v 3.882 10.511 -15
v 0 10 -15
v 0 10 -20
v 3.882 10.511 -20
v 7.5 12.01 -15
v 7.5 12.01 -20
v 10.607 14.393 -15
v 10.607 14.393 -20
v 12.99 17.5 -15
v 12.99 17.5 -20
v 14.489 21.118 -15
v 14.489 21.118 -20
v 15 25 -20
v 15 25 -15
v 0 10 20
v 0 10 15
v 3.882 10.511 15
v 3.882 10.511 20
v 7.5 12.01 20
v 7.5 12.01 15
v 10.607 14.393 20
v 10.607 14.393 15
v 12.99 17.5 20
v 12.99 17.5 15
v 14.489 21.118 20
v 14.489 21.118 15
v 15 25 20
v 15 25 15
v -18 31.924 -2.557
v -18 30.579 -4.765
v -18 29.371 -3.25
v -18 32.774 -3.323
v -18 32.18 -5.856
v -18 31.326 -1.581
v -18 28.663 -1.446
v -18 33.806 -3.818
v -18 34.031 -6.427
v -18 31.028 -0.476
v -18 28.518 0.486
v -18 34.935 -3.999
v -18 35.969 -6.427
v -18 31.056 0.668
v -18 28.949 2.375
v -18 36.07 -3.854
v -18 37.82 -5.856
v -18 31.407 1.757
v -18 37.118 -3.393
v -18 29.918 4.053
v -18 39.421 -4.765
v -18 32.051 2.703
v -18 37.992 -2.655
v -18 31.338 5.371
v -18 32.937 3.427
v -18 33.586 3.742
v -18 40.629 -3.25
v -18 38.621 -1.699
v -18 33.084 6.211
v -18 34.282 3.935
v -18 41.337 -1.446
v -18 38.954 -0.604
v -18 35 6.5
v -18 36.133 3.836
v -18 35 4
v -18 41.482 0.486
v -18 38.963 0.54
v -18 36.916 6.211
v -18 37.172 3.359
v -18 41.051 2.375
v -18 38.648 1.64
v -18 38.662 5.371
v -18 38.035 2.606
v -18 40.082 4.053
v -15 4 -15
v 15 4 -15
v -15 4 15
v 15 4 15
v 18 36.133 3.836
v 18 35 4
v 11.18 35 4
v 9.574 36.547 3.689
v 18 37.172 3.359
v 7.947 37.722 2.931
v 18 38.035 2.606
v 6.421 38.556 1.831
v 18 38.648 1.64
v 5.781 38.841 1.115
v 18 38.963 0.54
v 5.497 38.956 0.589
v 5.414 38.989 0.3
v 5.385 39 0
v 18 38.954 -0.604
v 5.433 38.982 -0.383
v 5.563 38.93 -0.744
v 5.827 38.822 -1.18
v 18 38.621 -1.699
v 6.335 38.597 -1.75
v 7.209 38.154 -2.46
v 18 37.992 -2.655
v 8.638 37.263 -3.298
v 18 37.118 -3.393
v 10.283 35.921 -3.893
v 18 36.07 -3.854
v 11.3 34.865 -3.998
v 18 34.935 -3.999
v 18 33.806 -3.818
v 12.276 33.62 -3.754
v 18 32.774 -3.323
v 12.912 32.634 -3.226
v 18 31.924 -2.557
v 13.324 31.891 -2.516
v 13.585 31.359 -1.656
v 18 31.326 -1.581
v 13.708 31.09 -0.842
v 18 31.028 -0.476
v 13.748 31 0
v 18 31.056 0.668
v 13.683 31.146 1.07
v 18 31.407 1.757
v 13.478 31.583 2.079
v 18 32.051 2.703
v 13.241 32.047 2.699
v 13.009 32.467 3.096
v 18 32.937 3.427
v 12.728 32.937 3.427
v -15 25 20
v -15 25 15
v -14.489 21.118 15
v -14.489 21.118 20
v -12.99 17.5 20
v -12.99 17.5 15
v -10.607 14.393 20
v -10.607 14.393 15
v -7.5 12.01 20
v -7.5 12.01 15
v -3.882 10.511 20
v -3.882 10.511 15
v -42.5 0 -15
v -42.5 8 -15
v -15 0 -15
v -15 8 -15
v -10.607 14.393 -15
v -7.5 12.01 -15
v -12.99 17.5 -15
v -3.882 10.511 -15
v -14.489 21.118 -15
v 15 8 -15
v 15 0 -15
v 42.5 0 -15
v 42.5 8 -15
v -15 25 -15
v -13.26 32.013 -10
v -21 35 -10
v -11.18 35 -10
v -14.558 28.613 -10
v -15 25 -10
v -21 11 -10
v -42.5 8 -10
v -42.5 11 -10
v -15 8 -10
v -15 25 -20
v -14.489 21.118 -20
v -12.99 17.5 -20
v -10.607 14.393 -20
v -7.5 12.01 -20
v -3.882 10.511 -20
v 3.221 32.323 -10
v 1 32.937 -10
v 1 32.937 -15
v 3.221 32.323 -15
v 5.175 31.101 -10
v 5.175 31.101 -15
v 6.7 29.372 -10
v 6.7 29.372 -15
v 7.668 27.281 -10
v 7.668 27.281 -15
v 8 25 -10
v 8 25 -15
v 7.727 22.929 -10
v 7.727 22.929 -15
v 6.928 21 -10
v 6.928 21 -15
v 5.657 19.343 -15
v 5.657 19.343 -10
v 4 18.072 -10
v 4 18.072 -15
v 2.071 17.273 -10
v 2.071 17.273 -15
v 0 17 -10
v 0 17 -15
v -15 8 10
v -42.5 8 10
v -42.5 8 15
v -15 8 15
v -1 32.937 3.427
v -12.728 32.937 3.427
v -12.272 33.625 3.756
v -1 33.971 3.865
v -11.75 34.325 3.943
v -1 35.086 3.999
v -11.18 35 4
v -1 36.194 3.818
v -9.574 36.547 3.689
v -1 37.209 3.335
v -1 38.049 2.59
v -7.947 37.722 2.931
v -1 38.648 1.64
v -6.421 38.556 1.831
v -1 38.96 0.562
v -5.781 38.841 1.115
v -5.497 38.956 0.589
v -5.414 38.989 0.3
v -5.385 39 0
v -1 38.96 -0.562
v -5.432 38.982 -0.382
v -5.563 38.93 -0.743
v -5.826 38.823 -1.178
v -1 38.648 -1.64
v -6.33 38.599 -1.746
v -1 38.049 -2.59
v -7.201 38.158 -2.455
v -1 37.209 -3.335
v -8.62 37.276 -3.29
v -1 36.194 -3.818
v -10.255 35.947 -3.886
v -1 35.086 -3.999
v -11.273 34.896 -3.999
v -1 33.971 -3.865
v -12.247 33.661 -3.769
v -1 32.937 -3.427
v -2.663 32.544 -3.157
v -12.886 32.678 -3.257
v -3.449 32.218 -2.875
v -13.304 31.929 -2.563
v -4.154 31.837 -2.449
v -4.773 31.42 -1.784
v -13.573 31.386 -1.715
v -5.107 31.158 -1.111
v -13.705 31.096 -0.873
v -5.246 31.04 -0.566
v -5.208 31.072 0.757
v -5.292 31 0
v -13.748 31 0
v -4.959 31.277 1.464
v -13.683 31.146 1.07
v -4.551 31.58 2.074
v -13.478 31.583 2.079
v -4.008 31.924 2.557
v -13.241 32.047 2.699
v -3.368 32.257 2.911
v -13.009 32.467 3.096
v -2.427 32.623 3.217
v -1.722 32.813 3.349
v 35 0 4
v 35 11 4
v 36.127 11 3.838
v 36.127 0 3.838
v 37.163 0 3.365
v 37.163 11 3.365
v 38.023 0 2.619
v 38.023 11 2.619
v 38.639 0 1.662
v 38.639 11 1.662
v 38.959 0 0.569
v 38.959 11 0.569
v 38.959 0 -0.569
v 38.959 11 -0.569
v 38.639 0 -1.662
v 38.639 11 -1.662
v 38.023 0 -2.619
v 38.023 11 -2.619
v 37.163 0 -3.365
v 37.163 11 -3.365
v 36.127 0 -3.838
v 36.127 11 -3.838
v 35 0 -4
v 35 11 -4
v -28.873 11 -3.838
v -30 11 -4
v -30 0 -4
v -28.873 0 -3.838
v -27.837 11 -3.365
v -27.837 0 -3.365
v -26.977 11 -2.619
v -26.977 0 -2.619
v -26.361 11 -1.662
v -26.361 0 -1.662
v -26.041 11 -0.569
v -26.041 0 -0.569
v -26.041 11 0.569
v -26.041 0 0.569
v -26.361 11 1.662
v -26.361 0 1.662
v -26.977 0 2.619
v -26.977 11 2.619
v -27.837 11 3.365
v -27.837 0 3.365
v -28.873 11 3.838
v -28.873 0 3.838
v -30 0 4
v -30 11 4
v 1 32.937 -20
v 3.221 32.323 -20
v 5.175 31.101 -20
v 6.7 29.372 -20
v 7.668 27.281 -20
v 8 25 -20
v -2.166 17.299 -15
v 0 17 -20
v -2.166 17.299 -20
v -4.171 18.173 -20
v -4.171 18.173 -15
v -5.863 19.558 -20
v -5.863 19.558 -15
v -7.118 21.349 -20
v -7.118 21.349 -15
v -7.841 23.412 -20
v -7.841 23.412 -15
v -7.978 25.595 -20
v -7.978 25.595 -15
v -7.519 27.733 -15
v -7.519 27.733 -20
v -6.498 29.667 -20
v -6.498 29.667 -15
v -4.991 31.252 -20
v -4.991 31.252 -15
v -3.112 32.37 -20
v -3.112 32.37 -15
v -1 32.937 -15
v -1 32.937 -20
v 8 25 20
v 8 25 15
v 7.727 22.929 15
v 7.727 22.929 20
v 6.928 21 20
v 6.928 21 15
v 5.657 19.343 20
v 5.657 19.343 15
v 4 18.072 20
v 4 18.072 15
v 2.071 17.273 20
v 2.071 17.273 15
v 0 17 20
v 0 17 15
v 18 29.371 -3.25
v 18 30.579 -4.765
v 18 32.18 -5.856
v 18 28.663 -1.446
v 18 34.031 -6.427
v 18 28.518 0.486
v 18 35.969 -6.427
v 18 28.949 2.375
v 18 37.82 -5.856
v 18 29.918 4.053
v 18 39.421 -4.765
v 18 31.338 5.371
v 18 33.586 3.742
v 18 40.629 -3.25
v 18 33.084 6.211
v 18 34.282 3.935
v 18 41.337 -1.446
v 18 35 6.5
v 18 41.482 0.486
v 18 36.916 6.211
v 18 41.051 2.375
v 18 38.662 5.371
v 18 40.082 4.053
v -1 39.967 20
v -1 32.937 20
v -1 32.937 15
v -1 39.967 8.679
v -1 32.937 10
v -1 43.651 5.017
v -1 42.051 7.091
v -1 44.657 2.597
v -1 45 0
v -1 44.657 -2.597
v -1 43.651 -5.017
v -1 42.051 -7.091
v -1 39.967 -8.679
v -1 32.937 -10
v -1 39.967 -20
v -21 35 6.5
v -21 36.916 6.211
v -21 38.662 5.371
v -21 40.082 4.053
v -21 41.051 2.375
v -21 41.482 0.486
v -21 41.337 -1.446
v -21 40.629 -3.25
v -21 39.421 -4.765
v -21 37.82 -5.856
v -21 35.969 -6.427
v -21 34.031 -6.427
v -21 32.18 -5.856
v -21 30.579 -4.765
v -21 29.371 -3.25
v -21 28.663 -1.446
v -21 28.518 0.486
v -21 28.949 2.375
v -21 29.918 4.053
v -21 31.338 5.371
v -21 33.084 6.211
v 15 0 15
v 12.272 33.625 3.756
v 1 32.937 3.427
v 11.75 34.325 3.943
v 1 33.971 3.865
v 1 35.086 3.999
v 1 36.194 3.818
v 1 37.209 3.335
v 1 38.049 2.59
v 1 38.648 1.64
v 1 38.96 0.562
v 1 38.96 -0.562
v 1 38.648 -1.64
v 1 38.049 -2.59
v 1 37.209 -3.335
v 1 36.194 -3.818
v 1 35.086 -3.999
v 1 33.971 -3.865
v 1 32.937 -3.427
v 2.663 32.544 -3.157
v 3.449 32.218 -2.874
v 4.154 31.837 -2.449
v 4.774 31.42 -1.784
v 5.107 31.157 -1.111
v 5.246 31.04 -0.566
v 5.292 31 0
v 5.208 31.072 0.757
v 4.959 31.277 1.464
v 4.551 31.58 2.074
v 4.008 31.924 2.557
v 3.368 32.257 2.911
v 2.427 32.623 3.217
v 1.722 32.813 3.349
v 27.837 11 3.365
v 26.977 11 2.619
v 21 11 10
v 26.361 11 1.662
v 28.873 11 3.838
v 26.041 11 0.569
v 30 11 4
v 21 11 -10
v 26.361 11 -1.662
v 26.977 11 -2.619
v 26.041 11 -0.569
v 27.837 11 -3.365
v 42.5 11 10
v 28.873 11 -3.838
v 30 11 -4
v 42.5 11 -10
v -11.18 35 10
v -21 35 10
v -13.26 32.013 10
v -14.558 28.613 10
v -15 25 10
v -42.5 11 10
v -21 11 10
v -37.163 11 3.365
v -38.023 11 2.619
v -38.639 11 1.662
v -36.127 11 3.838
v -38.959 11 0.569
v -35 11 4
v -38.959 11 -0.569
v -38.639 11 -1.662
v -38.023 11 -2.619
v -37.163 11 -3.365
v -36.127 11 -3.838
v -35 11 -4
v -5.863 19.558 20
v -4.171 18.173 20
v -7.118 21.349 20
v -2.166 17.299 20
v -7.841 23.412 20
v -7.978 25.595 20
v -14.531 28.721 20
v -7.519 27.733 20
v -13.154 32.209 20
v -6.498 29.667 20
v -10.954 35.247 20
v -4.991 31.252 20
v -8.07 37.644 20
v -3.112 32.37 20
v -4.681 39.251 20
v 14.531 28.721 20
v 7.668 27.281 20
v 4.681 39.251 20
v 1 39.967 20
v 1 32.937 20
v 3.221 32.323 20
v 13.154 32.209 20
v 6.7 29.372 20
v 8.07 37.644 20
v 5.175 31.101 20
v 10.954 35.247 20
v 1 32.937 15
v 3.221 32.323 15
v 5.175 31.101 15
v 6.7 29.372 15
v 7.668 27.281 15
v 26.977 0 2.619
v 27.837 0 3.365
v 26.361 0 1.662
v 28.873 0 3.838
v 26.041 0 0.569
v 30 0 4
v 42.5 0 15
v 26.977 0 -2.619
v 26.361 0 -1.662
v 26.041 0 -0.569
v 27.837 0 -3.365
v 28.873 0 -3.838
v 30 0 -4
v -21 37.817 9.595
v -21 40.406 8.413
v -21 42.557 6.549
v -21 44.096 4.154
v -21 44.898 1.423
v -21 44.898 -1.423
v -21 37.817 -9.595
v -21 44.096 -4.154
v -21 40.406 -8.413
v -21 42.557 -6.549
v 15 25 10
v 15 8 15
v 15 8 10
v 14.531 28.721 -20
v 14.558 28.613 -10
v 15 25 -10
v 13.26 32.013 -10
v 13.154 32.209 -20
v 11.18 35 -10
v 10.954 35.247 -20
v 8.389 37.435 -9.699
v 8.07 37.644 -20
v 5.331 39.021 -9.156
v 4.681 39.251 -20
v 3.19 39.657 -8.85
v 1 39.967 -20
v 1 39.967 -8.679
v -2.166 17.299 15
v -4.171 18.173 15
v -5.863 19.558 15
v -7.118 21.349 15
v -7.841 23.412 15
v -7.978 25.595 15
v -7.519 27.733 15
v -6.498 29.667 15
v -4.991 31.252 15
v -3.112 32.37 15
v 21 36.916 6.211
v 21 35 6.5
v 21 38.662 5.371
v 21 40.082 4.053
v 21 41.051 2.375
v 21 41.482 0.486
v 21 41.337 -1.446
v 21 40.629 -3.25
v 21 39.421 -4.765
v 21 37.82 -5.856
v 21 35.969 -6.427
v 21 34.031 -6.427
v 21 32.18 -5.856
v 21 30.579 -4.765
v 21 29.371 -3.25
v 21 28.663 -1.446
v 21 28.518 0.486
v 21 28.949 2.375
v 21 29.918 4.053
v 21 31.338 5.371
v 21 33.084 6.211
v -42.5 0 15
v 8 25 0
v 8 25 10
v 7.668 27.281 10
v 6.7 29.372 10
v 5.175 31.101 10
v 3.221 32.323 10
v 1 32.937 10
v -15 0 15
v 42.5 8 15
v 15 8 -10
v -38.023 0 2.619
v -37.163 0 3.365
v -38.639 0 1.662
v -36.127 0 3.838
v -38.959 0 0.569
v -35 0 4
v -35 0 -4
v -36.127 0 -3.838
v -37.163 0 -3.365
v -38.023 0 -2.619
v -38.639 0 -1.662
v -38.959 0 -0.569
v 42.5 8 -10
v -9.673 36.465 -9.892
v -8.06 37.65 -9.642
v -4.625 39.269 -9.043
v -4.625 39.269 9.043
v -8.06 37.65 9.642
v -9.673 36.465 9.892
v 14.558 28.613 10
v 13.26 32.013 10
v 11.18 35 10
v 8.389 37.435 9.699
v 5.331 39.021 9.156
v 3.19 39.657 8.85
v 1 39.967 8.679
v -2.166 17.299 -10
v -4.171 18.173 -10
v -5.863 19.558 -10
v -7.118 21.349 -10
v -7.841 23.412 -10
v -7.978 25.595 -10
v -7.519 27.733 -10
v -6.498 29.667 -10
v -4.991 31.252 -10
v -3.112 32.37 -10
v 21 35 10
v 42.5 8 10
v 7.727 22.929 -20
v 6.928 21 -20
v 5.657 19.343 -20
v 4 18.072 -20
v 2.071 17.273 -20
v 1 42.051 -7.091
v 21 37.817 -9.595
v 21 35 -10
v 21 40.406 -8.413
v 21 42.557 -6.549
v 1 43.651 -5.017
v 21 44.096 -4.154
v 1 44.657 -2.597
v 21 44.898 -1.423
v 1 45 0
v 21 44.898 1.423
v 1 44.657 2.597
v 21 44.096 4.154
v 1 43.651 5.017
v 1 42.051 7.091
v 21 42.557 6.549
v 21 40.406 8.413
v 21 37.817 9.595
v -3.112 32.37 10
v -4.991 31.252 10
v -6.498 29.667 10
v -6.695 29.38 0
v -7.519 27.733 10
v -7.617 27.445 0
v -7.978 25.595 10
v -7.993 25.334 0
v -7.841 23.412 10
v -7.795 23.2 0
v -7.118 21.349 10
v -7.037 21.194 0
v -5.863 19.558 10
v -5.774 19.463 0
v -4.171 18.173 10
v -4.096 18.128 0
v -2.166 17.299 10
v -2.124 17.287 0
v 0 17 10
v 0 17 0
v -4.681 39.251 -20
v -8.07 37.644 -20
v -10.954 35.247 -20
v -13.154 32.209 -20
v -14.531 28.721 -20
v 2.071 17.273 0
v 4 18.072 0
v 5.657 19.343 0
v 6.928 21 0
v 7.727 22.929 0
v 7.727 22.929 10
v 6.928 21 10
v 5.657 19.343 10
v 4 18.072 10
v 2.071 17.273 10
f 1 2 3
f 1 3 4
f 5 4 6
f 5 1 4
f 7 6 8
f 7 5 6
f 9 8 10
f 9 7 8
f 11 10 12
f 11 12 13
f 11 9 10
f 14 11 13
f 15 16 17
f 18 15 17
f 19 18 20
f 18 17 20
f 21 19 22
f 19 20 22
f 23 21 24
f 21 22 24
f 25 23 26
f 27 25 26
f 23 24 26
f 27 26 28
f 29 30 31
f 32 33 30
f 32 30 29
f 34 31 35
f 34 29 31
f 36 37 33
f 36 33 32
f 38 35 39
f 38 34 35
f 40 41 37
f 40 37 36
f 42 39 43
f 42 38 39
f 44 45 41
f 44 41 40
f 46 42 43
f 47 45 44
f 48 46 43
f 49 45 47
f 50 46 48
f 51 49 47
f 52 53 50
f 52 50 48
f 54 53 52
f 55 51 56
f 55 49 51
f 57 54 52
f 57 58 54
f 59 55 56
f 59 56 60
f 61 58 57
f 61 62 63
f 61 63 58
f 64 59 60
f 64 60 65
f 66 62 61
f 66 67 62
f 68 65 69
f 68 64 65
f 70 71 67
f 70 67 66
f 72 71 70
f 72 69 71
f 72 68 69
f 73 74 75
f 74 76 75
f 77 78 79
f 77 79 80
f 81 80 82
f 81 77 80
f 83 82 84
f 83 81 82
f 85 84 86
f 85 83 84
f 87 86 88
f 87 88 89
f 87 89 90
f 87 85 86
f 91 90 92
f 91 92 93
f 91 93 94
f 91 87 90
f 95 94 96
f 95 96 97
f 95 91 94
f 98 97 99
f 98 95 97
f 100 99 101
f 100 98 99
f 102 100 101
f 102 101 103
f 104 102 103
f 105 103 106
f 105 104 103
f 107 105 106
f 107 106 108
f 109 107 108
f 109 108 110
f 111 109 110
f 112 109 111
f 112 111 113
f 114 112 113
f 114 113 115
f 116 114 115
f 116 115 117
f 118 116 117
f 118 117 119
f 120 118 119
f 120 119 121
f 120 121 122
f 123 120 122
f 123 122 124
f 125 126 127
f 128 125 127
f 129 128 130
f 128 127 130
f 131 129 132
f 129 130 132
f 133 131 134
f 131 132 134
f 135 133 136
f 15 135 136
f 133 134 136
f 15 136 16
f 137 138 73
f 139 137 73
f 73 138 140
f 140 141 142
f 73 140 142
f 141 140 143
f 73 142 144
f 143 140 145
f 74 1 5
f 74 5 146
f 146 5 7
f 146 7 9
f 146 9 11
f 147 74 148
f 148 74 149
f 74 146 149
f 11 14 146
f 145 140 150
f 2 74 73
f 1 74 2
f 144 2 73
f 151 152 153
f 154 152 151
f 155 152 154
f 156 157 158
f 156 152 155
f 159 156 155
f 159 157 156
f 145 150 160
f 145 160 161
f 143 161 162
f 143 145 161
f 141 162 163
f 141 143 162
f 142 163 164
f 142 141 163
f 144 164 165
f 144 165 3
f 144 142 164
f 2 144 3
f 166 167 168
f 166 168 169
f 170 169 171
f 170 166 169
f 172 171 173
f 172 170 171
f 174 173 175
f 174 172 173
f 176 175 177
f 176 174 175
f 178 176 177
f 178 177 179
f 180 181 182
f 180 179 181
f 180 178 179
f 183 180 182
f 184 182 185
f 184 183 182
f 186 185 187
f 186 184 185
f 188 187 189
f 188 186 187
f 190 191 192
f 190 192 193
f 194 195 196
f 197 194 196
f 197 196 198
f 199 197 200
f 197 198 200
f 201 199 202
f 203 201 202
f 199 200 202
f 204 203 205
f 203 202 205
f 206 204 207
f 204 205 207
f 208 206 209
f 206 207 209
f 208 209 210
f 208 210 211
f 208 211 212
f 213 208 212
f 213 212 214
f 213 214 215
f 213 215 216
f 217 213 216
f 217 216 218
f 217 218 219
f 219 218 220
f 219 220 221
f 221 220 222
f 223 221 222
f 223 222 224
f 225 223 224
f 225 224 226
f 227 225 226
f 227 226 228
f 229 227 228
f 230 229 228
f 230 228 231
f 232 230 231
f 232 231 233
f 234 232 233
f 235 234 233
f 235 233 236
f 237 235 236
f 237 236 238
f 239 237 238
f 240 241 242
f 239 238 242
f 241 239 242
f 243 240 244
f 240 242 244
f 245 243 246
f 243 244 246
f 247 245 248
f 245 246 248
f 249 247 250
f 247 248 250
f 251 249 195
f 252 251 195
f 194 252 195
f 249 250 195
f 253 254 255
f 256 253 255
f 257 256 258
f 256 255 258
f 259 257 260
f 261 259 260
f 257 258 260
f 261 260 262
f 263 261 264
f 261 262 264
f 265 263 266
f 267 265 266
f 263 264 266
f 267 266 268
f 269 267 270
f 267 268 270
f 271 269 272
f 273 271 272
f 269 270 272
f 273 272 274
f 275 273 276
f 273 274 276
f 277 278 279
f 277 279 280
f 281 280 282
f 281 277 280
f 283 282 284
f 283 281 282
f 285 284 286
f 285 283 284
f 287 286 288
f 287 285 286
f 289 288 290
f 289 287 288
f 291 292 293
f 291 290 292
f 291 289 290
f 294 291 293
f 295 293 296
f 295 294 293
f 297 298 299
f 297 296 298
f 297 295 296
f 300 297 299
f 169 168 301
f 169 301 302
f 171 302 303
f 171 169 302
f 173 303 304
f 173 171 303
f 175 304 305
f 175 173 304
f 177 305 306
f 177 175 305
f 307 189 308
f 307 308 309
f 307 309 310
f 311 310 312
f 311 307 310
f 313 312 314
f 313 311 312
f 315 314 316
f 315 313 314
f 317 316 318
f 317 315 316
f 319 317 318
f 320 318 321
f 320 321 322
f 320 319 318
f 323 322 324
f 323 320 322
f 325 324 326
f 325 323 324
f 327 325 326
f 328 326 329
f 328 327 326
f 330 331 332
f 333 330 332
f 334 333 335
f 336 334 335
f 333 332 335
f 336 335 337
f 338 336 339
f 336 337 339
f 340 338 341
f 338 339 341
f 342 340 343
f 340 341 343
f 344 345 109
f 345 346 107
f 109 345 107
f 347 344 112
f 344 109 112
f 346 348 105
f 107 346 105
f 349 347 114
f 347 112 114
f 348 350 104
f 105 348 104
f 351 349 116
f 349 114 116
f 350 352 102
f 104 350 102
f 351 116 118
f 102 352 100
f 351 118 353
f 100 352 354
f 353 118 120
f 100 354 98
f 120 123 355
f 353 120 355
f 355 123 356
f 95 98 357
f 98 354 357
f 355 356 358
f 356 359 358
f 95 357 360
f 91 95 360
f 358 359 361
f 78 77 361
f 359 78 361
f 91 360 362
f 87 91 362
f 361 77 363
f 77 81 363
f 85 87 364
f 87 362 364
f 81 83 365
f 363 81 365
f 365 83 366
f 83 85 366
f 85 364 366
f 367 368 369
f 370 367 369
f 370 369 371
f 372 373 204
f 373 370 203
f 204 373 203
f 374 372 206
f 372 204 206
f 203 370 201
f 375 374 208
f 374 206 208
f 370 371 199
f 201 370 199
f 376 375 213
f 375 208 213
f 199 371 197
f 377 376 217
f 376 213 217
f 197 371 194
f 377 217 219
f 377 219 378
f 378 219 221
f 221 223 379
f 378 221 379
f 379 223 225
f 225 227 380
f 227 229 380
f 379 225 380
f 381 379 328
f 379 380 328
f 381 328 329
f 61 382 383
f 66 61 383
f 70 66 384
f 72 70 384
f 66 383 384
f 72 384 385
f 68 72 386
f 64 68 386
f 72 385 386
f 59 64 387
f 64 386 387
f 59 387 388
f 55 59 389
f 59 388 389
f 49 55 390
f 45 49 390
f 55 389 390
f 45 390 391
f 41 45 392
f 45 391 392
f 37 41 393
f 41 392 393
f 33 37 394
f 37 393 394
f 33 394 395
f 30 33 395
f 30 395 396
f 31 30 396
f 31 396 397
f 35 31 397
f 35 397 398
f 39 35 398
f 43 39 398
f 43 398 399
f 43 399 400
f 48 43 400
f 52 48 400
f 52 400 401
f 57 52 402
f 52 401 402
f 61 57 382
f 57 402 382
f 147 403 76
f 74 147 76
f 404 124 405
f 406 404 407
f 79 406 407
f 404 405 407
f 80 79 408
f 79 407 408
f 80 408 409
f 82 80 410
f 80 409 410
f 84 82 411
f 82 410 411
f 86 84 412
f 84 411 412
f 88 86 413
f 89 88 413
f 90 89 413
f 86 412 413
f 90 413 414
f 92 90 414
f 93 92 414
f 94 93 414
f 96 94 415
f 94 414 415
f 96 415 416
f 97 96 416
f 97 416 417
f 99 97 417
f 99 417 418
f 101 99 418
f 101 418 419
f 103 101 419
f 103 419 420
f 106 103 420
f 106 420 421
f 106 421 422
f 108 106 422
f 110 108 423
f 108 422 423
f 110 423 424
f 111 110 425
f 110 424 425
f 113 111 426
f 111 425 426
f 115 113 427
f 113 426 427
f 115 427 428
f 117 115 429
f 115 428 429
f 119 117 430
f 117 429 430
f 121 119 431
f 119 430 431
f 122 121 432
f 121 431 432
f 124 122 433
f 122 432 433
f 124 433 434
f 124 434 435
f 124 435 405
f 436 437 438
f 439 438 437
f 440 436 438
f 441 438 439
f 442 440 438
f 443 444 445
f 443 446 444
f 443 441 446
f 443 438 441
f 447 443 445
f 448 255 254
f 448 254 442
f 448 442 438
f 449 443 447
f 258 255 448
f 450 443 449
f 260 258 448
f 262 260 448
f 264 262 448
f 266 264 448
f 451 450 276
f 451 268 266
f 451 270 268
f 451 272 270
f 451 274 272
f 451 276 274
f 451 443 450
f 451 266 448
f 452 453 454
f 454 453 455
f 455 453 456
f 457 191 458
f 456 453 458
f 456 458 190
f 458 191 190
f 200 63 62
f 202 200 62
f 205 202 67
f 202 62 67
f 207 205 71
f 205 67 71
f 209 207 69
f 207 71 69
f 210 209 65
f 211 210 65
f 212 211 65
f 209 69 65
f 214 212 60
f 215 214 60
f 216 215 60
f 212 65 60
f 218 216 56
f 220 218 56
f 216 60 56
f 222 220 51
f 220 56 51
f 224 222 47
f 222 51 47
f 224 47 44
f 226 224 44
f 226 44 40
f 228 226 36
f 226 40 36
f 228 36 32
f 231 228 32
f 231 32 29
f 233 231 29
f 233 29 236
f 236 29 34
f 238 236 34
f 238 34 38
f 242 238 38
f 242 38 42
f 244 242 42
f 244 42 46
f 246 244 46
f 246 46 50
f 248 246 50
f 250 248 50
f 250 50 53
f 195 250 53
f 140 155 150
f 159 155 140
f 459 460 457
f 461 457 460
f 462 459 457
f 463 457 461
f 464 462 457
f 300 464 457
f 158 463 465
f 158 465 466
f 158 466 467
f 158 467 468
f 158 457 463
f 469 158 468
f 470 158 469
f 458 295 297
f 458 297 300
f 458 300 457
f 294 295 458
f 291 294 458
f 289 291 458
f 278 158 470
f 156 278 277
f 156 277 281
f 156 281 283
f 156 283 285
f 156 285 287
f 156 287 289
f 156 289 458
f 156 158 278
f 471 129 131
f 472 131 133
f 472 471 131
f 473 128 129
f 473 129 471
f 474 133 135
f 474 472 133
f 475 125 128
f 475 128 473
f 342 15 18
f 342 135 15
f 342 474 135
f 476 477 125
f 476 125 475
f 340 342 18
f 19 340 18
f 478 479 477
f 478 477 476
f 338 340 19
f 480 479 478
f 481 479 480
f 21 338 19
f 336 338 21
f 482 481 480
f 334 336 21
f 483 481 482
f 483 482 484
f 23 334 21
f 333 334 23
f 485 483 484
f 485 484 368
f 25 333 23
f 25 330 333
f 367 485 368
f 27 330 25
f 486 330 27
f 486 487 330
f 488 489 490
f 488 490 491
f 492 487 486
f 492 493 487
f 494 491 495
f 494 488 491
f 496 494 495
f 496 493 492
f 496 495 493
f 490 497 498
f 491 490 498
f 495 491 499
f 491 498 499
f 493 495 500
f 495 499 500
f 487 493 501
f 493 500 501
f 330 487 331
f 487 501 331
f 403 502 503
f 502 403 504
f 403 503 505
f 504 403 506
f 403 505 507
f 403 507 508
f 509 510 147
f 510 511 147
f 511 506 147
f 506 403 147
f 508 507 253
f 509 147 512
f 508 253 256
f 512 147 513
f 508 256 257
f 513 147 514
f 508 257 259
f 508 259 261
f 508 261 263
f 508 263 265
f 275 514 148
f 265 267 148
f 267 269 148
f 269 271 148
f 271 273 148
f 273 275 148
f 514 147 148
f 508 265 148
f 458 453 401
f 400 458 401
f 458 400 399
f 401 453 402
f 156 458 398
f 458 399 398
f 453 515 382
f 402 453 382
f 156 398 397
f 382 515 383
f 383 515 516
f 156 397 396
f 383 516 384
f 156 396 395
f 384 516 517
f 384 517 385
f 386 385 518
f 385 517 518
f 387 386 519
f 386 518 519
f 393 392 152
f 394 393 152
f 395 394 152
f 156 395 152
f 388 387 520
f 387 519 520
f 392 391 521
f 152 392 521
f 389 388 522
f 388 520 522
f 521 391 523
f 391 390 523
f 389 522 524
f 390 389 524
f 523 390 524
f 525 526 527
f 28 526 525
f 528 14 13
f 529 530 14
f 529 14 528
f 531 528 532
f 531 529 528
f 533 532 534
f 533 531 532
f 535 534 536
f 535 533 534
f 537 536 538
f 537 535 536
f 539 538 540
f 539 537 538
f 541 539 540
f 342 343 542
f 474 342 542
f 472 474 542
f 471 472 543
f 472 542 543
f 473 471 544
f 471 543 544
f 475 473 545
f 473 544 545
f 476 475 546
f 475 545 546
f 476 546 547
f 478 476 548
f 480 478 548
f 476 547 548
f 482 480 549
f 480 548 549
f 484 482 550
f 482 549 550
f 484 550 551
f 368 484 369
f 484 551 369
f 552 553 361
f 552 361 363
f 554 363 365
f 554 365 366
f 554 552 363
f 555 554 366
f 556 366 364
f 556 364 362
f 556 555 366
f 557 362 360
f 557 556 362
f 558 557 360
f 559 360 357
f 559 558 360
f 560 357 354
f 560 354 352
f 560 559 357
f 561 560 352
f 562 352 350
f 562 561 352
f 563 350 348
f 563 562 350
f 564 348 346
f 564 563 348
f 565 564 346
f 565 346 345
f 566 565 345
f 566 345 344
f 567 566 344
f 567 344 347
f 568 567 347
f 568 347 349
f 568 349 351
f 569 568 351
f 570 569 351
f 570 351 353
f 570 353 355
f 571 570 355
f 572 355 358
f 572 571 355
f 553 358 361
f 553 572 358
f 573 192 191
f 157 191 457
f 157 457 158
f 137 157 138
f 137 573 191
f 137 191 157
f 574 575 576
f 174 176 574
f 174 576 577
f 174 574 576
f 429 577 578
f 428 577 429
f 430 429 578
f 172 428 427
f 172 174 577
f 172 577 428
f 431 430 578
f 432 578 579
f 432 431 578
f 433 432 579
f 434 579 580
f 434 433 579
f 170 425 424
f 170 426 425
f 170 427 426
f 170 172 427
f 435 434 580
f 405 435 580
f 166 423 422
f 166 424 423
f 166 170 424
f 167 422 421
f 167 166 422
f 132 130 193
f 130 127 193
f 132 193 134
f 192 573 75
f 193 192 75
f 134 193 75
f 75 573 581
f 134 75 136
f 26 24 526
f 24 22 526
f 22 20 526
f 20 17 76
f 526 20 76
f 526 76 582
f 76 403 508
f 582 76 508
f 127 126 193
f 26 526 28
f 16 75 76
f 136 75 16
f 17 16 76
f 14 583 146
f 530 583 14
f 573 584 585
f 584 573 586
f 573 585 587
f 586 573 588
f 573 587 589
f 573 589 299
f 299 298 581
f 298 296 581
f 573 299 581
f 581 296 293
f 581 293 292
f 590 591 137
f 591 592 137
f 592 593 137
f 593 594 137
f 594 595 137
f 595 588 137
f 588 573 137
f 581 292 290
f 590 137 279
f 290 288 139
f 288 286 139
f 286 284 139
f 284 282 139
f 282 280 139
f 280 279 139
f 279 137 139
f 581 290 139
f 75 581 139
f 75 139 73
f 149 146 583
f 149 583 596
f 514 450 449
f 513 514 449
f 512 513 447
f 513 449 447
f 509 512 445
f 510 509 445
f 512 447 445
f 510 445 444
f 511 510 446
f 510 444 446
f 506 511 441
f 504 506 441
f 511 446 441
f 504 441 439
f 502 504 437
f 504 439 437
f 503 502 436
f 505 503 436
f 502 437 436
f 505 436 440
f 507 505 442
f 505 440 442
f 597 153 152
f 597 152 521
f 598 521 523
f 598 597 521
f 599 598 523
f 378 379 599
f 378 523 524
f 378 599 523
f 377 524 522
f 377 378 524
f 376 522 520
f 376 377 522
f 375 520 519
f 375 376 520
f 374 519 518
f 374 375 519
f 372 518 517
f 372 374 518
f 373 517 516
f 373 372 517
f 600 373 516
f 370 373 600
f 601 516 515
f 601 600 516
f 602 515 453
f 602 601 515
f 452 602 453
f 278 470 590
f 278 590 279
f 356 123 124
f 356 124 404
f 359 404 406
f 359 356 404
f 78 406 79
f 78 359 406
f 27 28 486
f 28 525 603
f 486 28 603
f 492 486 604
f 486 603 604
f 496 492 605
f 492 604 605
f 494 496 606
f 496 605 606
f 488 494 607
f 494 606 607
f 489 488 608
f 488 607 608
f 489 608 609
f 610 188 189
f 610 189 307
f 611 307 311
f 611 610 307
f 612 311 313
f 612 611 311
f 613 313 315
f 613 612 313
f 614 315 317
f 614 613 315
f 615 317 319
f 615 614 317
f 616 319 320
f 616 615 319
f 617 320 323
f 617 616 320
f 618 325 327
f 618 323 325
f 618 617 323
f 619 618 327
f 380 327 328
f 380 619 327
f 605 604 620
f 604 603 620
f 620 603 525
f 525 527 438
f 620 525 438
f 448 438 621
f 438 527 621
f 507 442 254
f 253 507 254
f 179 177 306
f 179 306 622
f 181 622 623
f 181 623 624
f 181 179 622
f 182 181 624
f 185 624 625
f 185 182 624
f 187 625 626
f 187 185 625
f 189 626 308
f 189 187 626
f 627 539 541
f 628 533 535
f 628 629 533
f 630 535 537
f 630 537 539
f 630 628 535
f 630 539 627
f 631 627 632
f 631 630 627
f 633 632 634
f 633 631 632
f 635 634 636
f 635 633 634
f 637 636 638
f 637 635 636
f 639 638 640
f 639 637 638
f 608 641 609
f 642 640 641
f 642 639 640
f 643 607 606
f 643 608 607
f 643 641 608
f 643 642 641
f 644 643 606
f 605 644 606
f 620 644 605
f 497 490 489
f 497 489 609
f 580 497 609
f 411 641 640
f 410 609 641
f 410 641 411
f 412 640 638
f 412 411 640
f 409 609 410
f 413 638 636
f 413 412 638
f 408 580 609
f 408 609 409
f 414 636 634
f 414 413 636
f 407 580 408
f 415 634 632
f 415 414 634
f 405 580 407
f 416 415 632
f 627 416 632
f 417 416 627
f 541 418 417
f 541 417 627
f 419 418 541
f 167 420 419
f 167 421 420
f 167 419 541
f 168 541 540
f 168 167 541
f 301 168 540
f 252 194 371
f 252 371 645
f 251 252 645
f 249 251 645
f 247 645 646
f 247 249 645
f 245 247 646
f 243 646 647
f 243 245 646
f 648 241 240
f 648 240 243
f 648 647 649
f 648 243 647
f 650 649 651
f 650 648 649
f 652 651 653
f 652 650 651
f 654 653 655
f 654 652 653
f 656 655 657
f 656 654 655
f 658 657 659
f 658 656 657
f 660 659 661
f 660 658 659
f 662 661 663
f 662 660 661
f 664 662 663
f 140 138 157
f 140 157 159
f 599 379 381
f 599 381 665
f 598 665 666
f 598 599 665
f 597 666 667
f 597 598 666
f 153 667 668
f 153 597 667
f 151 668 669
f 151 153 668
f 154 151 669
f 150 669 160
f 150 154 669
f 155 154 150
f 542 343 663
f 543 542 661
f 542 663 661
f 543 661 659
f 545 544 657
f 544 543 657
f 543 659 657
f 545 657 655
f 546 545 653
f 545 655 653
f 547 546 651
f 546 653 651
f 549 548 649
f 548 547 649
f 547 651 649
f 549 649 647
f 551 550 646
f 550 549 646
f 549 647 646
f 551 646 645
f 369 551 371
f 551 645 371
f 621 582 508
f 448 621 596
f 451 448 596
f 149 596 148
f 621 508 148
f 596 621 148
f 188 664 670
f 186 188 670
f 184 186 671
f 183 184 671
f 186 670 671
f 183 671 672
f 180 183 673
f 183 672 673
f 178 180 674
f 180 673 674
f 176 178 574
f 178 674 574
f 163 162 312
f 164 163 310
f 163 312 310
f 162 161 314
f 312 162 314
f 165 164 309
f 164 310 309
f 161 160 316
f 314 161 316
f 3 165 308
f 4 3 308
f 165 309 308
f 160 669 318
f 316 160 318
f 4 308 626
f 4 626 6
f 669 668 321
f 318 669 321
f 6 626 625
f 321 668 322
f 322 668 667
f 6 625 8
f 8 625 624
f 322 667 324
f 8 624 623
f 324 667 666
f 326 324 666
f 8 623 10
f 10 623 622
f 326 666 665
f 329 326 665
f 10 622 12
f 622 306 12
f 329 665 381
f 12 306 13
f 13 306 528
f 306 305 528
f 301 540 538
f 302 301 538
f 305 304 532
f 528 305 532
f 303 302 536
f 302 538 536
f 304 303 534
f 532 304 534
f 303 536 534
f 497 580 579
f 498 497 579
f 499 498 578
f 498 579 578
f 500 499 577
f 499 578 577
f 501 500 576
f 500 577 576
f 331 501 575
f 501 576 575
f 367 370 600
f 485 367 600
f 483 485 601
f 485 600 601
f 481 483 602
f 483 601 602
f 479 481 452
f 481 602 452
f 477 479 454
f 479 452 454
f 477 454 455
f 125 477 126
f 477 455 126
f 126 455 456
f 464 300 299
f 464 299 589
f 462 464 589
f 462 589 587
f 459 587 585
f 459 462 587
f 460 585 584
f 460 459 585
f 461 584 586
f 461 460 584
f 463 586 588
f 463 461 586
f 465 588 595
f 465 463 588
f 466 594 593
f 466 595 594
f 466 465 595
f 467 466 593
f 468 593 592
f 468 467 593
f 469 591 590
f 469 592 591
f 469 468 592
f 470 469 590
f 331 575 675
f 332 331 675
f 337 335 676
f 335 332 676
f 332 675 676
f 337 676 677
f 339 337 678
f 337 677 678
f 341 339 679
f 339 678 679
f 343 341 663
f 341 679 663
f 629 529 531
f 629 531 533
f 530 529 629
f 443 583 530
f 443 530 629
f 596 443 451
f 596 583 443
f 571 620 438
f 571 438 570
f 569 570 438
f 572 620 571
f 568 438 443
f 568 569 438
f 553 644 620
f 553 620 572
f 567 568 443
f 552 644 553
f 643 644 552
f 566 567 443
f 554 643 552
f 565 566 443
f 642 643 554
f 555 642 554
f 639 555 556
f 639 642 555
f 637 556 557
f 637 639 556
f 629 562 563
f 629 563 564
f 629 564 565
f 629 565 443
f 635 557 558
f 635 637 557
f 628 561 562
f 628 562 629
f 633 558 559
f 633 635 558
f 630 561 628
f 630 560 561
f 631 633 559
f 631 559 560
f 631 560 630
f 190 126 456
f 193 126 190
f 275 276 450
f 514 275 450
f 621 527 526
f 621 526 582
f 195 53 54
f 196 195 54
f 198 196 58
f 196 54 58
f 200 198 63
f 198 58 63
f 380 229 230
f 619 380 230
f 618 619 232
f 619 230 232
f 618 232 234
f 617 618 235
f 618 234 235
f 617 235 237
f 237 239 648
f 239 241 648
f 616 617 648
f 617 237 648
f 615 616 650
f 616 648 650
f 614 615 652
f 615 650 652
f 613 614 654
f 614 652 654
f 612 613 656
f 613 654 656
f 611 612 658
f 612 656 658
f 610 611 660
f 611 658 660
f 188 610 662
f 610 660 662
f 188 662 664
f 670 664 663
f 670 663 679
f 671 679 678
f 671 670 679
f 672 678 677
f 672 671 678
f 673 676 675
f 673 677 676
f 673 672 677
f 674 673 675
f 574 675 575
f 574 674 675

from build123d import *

# Parameters (mm, degrees)
SKETCH_1_W                 = 85
SKETCH_1_H                 = 5
EXTRUDE_1_DEPTH            = 8
EXTRUDE_1_2_DEPTH          = 8
SKETCH_1_3_W               = 85
SKETCH_1_3_H               = 20
EXTRUDE_2_DEPTH            = 11
EXTRUDE_3_DEPTH            = 21
SKETCH_6_R                 = 6.5
SKETCH_6_R_2               = 4
CUT_EXTRUDE_1_DEPTH        = 3
SKETCH_6_2_R               = 4
CUT_EXTRUDE_2_DEPTH        = 21
SKETCH_10_R                = 15
SKETCH_10_R_2              = 8
EXTRUDE_6_DEPTH            = 20
EXTRUDE_7_DEPTH            = 15
SKETCH_10_4_W              = 30
SKETCH_10_4_H              = 4
SKETCH_10_4_R              = 8
CUT_EXTRUDE_4_DEPTH        = 15
CUT_EXTRUDE_2_2_DEPTH      = 66.048059256
CUT_EXTRUDE_2_2_DEPTH_BACK = 1
CUT_EXTRUDE_2_2_START      = 25
SKETCH_12_W                = 2
SKETCH_12_H                = 40
CUT_EXTRUDE_5_REACH        = 59.985
SKETCH_6_4_R               = 4
CUT_EXTRUDE_6_DEPTH        = 81.357015954


with BuildPart() as part:
    # 草图1 → 凸台-拉伸1 (new body)
    with BuildSketch(Plane(origin=(0, 0, 0), x_dir=(1, 0, 0), z_dir=(0, 1, 0))):
        with Locations((0, 12.5)):
            Rectangle(SKETCH_1_W, SKETCH_1_H)
    extrude(amount=EXTRUDE_1_DEPTH)



with BuildPart() as body_2:
    # 草图1 → Extrude 1 2 (new body)
    with BuildSketch(Plane(origin=(0, 0, 0), x_dir=(1, 0, 0), z_dir=(0, 1, 0))):
        with Locations((0, -12.5)):
            Rectangle(SKETCH_1_W, SKETCH_1_H)
    extrude(amount=EXTRUDE_1_2_DEPTH)


with BuildPart() as part_1:
    add(part.part)

    add(body_2.part)  # 凸台-拉伸2 merges body 2
    # 草图1<3> → 凸台-拉伸2 (add)
    with BuildSketch(Plane(origin=(0, 0, 0), x_dir=(1, 0, 0), z_dir=(0, 1, 0))):
        Rectangle(SKETCH_1_3_W, SKETCH_1_3_H)
    extrude(amount=EXTRUDE_2_DEPTH)

    # 草图3 → 凸台-拉伸3 (add, symmetric)
    with BuildSketch(Plane(origin=(0, 0, 0), x_dir=(0, 0, -1), z_dir=(1, 0, 0))):
        with BuildLine():
            Line((-10, 35), (-10, 11))
            Line((-10, 11), (10, 11))
            Line((10, 11), (10, 35))
            ThreePointArc((10, 35), (0, 45), (-10, 35))
        make_face()
    extrude(amount=EXTRUDE_3_DEPTH, both=True)

    # 草图6 → 切除-拉伸1 (cut)
    with BuildSketch(Plane.ZY.offset(21)):
        with Locations((0, 35)):
            Circle(SKETCH_6_R)
        with Locations((0, 35)):
            Circle(SKETCH_6_R_2, mode=Mode.SUBTRACT)
    cut_extrude_1 = extrude(amount=-CUT_EXTRUDE_1_DEPTH, mode=Mode.SUBTRACT)

    # 草图6<2> → Cut-Extrude 2 (cut)
    with BuildSketch(Plane.ZY.offset(21)):
        with Locations((0, 35)):
            Circle(SKETCH_6_2_R)
    cut_extrude_2 = extrude(amount=-CUT_EXTRUDE_2_DEPTH, mode=Mode.SUBTRACT)

    # 镜向1: 切除-拉伸1, Cut-Extrude 2 across plane
    add(cut_extrude_1.mirror(Plane(origin=(0, 0, 0), x_dir=(0, 0, 1), z_dir=(1, 0, 0))), mode=Mode.SUBTRACT)
    add(cut_extrude_2.mirror(Plane(origin=(0, 0, 0), x_dir=(0, 0, 1), z_dir=(1, 0, 0))), mode=Mode.SUBTRACT)

    # 草图10 → 凸台-拉伸6 (add, symmetric)
    with BuildSketch(Plane.XY):
        with Locations((0, 25)):
            Circle(SKETCH_10_R)
        with Locations((0, 25)):
            Circle(SKETCH_10_R_2, mode=Mode.SUBTRACT)
    extrude(amount=EXTRUDE_6_DEPTH, both=True)

    # 草图10<3> → 凸台-拉伸7 (add, symmetric)
    with BuildSketch(Plane.XY):
        with BuildLine():
            Line((15, 8), (15, 25))
            ThreePointArc((15, 25), (0, 10), (-15, 25))
            Line((-15, 25), (-15, 8))
            Line((-15, 8), (15, 8))
        make_face()
    extrude(amount=EXTRUDE_7_DEPTH, both=True)

    # 草图10<4> → 切除-拉伸4 (cut, symmetric)
    with BuildSketch(Plane.XY):
        with Locations((0, 2)):
            Rectangle(SKETCH_10_4_W, SKETCH_10_4_H)
        with Locations((0, 25)):
            Circle(SKETCH_10_4_R)
    extrude(amount=CUT_EXTRUDE_4_DEPTH, both=True, mode=Mode.SUBTRACT)

    # 草图12 → Cut-Extrude 2 2 (cut, two sides: drawn at the far end of the back side and taken through both)
    with BuildSketch(Plane(origin=(0, 0, 0), x_dir=(1, 0, 0), z_dir=(0, 1, 0)).offset(CUT_EXTRUDE_2_2_START - CUT_EXTRUDE_2_2_DEPTH_BACK)):
        Rectangle(SKETCH_12_W, SKETCH_12_H)
    extrude(amount=CUT_EXTRUDE_2_2_DEPTH + CUT_EXTRUDE_2_2_DEPTH_BACK, mode=Mode.SUBTRACT)

    # 草图14 → 切除-拉伸5 (cut, up to next)
    with BuildSketch(Plane(origin=(0, 11, 0), x_dir=(1, 0, 0), z_dir=(0, 1, 0)), mode=Mode.PRIVATE) as cut_extrude_5_sk1:
        with BuildLine():
            Line((-35, 4), (-30, 4))
            ThreePointArc((-30, 4), (-26, 0), (-30, -4))
            Line((-30, -4), (-35, -4))
            ThreePointArc((-35, -4), (-39, 0), (-35, 4))
        make_face()
    cut_extrude_5_tool1 = extrude(cut_extrude_5_sk1.sketch, amount=-CUT_EXTRUDE_5_REACH, mode=Mode.PRIVATE) & part_1.part
    # 草图14 → 切除-拉伸5 (cut, up to next)
    with BuildSketch(Plane(origin=(0, 11, 0), x_dir=(1, 0, 0), z_dir=(0, 1, 0)), mode=Mode.PRIVATE) as cut_extrude_5_sk2:
        with BuildLine():
            Line((35, 4), (30, 4))
            ThreePointArc((30, 4), (26, 0), (30, -4))
            Line((30, -4), (35, -4))
            ThreePointArc((35, -4), (39, 0), (35, 4))
        make_face()
    cut_extrude_5_tool2 = extrude(cut_extrude_5_sk2.sketch, amount=-CUT_EXTRUDE_5_REACH, mode=Mode.PRIVATE) & part_1.part
    add(cut_extrude_5_tool1.solids().sort_by_distance((-32.5, 11, 0))[0], mode=Mode.SUBTRACT)
    add(cut_extrude_5_tool2.solids().sort_by_distance((32.5, 11, 0))[0], mode=Mode.SUBTRACT)

    # 草图6<4> → 切除-拉伸6 (cut, through all)
    with BuildSketch(Plane.ZY.offset(21)):
        with Locations((0, 35)):
            Circle(SKETCH_6_4_R)
    extrude(amount=-CUT_EXTRUDE_6_DEPTH, mode=Mode.SUBTRACT)


solid = part_1.part
